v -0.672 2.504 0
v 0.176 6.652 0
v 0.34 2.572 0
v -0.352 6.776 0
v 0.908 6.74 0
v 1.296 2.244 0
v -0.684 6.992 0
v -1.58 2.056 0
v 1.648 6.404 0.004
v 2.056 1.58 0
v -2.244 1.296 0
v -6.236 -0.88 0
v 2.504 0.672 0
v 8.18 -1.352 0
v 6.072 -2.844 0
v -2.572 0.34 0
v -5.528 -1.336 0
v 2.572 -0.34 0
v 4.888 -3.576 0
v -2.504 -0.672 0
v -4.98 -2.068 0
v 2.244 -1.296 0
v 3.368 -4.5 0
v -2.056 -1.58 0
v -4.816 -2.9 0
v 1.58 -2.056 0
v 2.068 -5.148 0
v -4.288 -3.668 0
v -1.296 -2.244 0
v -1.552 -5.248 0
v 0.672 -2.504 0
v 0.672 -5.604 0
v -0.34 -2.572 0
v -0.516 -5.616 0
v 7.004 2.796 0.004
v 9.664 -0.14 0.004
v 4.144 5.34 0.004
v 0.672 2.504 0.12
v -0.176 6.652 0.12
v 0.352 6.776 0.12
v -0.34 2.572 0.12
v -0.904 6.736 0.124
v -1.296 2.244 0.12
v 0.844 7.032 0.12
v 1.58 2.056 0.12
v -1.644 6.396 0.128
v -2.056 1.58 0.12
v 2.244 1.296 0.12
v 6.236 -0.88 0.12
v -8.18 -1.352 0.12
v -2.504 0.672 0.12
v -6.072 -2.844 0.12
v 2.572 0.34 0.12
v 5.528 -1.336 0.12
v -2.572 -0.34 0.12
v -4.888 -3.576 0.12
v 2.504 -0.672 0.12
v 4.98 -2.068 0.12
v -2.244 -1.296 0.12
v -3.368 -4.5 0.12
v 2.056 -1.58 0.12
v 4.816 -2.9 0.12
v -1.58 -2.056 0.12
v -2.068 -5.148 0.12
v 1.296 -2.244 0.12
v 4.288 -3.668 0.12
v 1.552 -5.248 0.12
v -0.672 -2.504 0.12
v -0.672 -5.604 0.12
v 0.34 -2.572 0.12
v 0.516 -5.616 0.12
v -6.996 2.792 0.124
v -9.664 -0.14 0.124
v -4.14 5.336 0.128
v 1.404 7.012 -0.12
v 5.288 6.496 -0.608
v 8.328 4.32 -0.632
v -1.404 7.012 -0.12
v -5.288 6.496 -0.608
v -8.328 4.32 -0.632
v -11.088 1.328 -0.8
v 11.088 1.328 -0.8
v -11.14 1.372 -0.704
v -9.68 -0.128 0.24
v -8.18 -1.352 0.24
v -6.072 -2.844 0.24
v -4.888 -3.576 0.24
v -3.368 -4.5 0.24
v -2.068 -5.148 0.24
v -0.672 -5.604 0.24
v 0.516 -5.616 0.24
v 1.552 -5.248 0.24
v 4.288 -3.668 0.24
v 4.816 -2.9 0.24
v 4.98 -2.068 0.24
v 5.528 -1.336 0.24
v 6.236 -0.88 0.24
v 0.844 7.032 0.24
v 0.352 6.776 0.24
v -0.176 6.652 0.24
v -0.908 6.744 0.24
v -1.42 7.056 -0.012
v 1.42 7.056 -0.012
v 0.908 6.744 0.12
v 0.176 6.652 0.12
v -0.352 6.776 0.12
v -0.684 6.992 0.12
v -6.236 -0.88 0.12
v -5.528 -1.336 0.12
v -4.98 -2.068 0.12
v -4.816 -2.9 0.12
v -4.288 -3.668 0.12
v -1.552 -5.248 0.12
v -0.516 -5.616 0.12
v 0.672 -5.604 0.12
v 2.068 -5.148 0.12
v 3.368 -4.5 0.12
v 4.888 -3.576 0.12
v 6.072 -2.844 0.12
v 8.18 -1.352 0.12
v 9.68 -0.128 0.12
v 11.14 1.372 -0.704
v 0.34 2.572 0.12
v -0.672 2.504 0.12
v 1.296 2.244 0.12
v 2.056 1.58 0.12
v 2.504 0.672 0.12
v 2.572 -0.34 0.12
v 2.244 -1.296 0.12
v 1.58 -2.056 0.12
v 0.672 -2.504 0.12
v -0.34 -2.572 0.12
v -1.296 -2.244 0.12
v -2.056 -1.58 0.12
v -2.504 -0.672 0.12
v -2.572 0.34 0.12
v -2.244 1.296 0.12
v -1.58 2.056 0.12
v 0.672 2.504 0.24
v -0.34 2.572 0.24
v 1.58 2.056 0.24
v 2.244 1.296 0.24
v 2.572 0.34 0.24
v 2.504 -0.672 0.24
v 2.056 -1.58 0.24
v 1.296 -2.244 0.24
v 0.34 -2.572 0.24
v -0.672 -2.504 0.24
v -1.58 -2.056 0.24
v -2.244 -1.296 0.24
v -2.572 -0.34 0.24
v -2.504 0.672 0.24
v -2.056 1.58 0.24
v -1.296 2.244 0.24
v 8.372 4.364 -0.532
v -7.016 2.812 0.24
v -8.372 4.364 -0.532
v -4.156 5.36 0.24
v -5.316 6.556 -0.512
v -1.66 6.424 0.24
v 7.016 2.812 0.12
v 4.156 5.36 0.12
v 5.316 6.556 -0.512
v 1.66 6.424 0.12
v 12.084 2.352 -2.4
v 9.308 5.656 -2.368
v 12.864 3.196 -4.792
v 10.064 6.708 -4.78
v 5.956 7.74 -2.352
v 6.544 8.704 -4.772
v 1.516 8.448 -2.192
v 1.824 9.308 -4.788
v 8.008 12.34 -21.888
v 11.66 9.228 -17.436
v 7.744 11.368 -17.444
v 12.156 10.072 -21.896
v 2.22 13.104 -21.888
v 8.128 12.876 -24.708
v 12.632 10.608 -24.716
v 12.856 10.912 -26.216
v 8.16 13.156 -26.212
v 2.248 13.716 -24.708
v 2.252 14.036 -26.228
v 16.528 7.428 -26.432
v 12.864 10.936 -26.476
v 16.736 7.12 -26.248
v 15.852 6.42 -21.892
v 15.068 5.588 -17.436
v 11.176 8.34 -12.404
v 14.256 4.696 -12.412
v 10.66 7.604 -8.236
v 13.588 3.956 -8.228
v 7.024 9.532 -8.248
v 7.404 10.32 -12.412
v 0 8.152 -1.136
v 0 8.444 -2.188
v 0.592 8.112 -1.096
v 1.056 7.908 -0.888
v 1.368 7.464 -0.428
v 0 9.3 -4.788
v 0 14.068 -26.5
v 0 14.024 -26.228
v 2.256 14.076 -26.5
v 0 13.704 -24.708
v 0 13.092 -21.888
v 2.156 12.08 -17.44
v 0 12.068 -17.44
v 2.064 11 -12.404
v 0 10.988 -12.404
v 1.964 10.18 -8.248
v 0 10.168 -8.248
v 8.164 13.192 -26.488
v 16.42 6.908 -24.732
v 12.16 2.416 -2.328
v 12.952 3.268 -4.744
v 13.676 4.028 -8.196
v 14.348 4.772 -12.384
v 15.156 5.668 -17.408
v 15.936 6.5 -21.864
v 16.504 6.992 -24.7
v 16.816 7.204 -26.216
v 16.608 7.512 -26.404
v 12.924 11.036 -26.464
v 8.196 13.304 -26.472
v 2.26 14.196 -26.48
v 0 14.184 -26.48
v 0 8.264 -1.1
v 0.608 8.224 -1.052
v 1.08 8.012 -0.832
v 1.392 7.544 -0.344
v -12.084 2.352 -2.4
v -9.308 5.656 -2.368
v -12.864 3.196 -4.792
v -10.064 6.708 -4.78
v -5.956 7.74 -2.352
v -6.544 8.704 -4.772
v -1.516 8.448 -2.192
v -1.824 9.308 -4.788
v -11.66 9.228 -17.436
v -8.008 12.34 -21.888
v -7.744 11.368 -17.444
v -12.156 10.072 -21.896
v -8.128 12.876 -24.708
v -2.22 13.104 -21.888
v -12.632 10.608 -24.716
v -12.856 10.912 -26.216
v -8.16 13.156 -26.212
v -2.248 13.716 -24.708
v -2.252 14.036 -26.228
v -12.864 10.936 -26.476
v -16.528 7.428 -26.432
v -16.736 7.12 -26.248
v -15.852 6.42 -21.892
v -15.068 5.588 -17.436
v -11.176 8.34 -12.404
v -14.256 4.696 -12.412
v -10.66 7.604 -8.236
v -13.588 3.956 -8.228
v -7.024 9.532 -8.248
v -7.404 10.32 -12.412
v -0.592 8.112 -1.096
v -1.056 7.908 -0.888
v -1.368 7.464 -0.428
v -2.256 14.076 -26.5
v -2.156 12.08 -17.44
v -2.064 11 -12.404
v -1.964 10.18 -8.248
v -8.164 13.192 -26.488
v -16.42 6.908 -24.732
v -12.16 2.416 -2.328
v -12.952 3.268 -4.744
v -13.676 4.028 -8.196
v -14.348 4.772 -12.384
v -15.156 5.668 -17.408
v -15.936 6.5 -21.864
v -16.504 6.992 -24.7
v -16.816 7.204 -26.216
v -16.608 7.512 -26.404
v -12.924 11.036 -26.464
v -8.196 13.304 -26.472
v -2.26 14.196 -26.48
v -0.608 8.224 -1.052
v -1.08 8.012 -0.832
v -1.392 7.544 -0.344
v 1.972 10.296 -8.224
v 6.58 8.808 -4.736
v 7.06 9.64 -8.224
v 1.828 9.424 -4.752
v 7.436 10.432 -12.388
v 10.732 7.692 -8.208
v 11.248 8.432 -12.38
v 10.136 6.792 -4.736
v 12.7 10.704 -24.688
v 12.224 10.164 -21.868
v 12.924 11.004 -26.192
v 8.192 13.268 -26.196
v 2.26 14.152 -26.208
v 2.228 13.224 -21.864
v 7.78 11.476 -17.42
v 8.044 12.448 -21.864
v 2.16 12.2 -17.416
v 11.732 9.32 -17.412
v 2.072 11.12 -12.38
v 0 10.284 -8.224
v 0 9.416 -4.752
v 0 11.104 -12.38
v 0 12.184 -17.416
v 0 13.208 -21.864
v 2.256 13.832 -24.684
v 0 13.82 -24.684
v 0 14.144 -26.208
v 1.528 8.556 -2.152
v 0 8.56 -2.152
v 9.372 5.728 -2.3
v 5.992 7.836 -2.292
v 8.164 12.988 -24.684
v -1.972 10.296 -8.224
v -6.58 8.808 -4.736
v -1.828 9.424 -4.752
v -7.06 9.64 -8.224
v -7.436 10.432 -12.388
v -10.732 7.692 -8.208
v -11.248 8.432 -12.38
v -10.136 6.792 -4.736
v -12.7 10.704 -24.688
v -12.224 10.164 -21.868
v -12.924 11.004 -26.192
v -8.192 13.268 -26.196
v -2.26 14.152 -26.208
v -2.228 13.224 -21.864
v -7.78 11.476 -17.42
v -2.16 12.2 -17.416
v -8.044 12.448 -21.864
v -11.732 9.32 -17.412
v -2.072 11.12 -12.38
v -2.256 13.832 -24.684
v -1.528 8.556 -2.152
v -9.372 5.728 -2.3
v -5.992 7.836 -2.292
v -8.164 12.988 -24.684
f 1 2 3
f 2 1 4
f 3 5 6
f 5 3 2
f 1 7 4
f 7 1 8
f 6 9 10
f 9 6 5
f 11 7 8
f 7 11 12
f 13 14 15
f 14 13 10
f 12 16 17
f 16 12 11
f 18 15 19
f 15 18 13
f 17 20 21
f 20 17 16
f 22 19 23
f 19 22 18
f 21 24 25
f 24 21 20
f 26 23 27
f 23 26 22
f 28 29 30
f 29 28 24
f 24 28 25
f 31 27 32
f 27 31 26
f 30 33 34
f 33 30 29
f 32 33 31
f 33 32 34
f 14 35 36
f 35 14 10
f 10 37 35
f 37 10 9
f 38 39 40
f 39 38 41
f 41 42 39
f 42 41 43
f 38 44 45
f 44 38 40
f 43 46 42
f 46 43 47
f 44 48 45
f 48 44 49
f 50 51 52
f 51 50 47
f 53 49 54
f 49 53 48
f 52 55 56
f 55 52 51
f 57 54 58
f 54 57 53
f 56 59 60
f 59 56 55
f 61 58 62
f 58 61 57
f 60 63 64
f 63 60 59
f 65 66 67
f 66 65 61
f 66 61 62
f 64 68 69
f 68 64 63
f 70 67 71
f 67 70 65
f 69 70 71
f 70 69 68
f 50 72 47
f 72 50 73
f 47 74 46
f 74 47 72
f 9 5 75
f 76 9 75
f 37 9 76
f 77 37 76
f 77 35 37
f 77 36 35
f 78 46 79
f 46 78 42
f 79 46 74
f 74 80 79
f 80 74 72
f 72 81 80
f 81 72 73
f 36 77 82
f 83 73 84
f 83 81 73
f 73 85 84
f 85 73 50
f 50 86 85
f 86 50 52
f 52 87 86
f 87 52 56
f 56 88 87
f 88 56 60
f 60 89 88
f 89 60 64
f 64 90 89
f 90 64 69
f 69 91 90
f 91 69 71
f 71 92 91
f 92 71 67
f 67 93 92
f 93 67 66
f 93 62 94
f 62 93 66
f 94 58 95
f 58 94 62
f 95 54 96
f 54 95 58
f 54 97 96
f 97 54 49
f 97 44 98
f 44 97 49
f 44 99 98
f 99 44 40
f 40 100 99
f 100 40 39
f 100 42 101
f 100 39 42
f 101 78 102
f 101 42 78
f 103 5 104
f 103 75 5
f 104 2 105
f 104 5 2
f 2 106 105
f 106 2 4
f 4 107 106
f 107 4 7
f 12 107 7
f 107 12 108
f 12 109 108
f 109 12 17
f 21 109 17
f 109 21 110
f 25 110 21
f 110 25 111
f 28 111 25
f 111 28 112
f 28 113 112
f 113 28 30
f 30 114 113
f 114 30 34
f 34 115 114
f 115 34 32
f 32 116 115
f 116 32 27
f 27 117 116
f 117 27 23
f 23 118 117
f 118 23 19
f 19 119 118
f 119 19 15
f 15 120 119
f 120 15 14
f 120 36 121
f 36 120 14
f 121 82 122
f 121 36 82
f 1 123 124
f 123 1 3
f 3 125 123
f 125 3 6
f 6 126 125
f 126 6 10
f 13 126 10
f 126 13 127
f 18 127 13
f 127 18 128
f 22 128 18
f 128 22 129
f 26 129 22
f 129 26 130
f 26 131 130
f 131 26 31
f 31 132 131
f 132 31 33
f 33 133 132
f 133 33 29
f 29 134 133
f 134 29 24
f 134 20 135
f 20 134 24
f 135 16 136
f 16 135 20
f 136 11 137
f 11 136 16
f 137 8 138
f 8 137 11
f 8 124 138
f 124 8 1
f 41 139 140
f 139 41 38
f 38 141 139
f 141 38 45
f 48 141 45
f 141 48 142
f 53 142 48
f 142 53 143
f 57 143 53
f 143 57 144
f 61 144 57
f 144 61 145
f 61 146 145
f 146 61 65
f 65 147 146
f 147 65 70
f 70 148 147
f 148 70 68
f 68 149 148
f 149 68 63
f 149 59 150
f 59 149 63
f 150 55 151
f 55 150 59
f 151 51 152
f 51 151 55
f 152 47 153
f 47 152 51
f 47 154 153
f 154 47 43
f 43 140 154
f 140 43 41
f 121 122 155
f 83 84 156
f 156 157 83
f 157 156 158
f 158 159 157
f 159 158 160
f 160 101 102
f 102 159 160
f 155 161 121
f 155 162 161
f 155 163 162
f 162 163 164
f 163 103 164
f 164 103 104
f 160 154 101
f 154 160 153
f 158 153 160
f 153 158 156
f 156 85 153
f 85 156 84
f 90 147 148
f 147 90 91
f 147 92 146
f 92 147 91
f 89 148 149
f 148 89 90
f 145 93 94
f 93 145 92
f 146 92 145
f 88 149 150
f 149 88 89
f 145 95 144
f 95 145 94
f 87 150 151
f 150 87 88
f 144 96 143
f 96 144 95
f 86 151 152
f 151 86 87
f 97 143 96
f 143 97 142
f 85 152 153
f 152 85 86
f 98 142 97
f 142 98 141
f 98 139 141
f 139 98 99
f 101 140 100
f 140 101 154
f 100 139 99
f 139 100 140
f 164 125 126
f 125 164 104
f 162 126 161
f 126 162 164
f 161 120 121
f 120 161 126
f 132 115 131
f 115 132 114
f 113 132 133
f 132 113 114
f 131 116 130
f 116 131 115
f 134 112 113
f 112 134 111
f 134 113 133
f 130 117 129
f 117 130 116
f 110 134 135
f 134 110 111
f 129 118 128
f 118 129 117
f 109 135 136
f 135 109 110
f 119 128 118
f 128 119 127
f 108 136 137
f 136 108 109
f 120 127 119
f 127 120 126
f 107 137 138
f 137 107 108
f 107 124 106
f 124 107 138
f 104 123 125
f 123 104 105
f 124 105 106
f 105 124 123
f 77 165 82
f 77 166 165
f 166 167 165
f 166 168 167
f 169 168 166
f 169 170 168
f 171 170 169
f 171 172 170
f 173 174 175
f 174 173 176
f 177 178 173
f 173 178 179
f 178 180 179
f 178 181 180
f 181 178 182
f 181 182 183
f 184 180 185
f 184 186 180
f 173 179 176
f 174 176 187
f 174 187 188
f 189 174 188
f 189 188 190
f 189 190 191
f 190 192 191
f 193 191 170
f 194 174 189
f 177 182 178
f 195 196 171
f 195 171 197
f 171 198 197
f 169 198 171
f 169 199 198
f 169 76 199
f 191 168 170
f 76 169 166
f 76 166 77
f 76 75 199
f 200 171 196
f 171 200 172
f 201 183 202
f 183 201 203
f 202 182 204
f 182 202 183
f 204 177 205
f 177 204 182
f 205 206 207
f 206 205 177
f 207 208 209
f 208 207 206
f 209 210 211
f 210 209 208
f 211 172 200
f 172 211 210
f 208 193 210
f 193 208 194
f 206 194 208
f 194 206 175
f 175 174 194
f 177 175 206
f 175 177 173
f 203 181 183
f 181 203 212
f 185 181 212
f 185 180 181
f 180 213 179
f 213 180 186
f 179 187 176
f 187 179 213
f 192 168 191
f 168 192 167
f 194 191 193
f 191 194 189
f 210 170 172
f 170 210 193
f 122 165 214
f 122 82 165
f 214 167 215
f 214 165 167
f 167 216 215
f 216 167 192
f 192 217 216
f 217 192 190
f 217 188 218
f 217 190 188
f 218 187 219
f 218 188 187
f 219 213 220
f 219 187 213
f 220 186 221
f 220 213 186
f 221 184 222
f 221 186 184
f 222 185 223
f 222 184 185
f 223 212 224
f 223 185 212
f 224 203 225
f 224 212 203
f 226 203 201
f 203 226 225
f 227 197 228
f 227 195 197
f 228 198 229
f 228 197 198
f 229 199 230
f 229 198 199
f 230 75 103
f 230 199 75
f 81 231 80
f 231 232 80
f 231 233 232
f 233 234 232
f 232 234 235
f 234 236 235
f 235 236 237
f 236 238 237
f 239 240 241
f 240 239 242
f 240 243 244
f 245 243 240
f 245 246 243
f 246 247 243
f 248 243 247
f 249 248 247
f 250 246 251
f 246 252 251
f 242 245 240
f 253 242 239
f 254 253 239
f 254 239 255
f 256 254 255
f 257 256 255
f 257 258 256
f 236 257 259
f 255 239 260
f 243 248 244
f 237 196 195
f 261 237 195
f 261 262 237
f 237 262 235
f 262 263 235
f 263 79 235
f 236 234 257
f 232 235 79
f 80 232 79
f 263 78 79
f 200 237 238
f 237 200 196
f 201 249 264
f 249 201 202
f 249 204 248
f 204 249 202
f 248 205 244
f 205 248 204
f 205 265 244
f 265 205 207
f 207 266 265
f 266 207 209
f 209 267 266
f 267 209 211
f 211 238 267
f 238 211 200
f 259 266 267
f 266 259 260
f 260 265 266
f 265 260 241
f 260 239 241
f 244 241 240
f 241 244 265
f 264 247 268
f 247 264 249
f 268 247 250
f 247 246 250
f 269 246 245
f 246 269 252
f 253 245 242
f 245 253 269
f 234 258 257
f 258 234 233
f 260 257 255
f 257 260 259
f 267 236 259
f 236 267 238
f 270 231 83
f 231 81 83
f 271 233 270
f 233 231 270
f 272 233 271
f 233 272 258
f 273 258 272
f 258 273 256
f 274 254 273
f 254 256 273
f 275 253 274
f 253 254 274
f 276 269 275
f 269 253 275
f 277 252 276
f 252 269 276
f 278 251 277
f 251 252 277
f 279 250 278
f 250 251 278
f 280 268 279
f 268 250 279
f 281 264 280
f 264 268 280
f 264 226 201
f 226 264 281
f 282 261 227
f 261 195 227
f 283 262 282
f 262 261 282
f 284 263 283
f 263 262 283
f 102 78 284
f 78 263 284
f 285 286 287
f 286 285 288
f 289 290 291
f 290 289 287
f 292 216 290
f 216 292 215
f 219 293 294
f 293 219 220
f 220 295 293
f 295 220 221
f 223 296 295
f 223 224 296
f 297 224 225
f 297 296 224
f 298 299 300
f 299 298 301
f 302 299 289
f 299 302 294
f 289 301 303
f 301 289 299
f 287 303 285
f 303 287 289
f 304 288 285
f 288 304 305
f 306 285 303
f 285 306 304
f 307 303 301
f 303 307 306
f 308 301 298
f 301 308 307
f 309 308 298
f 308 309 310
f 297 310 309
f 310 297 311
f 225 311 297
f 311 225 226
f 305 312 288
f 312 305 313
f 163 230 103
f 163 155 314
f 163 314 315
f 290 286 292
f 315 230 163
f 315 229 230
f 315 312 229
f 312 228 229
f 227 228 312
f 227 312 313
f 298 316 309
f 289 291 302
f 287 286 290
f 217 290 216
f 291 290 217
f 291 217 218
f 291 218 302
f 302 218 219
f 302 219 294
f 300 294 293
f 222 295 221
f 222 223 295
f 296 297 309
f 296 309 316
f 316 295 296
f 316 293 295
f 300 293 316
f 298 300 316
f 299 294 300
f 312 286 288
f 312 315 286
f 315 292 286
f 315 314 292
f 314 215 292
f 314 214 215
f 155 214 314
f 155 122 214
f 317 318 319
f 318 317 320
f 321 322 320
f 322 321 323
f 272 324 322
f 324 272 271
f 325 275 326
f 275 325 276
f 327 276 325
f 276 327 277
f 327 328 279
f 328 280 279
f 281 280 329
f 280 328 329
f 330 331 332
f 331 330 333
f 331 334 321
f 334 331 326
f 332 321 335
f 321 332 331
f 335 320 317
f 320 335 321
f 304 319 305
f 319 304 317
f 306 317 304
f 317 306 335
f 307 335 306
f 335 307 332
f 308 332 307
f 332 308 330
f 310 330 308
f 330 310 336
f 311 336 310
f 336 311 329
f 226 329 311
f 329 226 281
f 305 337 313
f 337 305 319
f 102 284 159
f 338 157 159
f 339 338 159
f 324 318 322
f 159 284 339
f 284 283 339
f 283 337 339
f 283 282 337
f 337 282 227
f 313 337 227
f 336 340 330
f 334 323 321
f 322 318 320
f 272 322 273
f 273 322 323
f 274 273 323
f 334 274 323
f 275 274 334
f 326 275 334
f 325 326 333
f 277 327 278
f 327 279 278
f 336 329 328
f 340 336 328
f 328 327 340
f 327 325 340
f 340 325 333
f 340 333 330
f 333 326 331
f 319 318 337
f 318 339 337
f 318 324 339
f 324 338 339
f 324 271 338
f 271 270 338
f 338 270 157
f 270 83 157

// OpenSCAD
use <../lib.scad>
use <s/50231s01.scad>
use <s/50231s02.scad>
use <s/50231s03.scad>
use <s/50231s04.scad>
function ldraw_lib__50231p01c01() = [
// 0 Minifig Cape Cloth with Inside Dark Red Pattern (Formed)
// 0 Name: 50231p01c01.dat
// 0 Author: Philippe Hurbain [Philo]
// 0 !LDRAW_ORG Part UPDATE 2019-01
// 0 !LICENSE Licensed under CC BY 4.0 : see CAreadme.txt
// 
// 0 !HELP Place at y = 0 on torso, head at y = -0.6
// 
// 0 BFC CERTIFY CCW
  [0,"BFC","CERTIFY"],
  [0,"BFC","CCW"],
// 
// 0 !CATEGORY Minifig Neckwear
// 0 !KEYWORDS 522, Cloak, Drape, Neckwear, Poncho, Shawl
// 
// 0 !HISTORY 2014-12-04 {LEGO Digital Designer} Original part shape
// 0 !HISTORY 2014-12-04 [Philo] File preparation for LDraw Parts Tracker
// 0 !HISTORY 2014-12-23 [PTadmin] Official Update 2014-02
// 0 !HISTORY 2019-01-26 [cwdee] Update category
// 0 !HISTORY 2019-06-28 [PTadmin] Official Update 2019-01
// 
// 
// 1 320 0 0 0 1 0 0 0 1 0 0 0 1 s\50231s01.dat
  [1,320,0,0,0,1,0,0,0,1,0,0,0,1, ldraw_lib__s__50231s01()],
// 1 16 0 0 0 1 0 0 0 1 0 0 0 1 s\50231s02.dat
  [1,16,0,0,0,1,0,0,0,1,0,0,0,1, ldraw_lib__s__50231s02()],
// 1 320 0 0 0 1 0 0 0 1 0 0 0 1 s\50231s03.dat
  [1,320,0,0,0,1,0,0,0,1,0,0,0,1, ldraw_lib__s__50231s03()],
// 1 320 0 0 0 -1 0 0 0 1 0 0 0 1 s\50231s03.dat
  [1,320,0,0,0,-1,0,0,0,1,0,0,0,1, ldraw_lib__s__50231s03()],
// 1 16 0 0 0 1 0 0 0 1 0 0 0 1 s\50231s04.dat
  [1,16,0,0,0,1,0,0,0,1,0,0,0,1, ldraw_lib__s__50231s04()],
// 1 16 0 0 0 -1 0 0 0 1 0 0 0 1 s\50231s04.dat
  [1,16,0,0,0,-1,0,0,0,1,0,0,0,1, ldraw_lib__s__50231s04()],
];
module ldraw_lib__50231p01c01(step=0, col=false, unit=2/5, alt=false, line=0.2, solid=!$preview)
    makepoly(ldraw_lib__50231p01c01(), step=step, col=col, unit=unit, alt=alt, line=line, solid=solid);
ldraw_lib__50231p01c01(line=0.2);
